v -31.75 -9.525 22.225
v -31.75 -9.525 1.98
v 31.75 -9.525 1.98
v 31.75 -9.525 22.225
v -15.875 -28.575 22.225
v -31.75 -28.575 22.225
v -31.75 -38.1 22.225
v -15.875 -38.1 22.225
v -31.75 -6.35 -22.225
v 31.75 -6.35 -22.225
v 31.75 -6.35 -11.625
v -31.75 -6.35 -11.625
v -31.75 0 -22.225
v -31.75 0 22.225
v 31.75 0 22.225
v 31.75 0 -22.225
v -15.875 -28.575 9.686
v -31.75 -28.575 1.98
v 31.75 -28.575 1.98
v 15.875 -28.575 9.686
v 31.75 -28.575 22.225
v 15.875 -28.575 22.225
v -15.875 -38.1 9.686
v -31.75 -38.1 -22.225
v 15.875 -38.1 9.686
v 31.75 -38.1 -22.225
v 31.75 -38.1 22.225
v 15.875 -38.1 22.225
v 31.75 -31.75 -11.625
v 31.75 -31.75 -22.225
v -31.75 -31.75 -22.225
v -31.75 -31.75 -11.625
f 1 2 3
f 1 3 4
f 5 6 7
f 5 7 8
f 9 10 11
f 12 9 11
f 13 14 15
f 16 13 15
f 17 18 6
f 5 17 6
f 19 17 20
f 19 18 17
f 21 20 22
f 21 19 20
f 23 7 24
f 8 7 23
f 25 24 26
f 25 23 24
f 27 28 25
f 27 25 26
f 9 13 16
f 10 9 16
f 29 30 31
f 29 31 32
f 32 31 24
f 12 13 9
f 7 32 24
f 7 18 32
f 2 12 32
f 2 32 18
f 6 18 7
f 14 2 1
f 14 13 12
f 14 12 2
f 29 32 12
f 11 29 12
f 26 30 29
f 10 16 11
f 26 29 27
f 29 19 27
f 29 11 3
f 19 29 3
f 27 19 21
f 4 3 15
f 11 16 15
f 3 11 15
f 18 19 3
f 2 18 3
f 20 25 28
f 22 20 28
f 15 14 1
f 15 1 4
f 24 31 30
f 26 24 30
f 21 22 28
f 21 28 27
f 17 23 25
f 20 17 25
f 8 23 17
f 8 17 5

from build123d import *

# Parameters (mm, degrees)
F0_W     = 63.5
F0_H     = 44.45
F1_DEPTH = 38.1
F3_W     = 19.05
F3_H     = 20.2448921431
F4_DEPTH = 63.5
F2_W     = 31.75
F2_H     = 12.5393269187
F5_DEPTH = 25.4
F6_W     = 25.4
F6_H     = 10.5997411049
F7_DEPTH = 63.5


with BuildPart() as f1:
    # F0 (on Front) → F1 (new body)
    with BuildSketch(Plane.XZ):
        Rectangle(F0_W, F0_H)
    extrude(amount=F1_DEPTH)

    # F3 (on face) → F4 (cut)
    with BuildSketch(Plane.YZ.offset(31.75)):
        with Locations((-19.05, 12.1025539285)):
            Rectangle(F3_W, F3_H)
    extrude(amount=-F4_DEPTH, mode=Mode.SUBTRACT)

    # F2 (on face) → F5 (cut)
    with BuildSketch(Plane.XZ.offset(38.1)):
        with Locations((0, 15.9553365407)):
            Rectangle(F2_W, F2_H)
    extrude(amount=-F5_DEPTH, mode=Mode.SUBTRACT)

    # F6 (on face) → F7 (cut)
    with BuildSketch(Plane.YZ.offset(31.75)):
        with Locations((-19.05, -16.9251294475)):
            Rectangle(F6_W, F6_H)
    extrude(amount=-F7_DEPTH, mode=Mode.SUBTRACT)


solid = f1.part
